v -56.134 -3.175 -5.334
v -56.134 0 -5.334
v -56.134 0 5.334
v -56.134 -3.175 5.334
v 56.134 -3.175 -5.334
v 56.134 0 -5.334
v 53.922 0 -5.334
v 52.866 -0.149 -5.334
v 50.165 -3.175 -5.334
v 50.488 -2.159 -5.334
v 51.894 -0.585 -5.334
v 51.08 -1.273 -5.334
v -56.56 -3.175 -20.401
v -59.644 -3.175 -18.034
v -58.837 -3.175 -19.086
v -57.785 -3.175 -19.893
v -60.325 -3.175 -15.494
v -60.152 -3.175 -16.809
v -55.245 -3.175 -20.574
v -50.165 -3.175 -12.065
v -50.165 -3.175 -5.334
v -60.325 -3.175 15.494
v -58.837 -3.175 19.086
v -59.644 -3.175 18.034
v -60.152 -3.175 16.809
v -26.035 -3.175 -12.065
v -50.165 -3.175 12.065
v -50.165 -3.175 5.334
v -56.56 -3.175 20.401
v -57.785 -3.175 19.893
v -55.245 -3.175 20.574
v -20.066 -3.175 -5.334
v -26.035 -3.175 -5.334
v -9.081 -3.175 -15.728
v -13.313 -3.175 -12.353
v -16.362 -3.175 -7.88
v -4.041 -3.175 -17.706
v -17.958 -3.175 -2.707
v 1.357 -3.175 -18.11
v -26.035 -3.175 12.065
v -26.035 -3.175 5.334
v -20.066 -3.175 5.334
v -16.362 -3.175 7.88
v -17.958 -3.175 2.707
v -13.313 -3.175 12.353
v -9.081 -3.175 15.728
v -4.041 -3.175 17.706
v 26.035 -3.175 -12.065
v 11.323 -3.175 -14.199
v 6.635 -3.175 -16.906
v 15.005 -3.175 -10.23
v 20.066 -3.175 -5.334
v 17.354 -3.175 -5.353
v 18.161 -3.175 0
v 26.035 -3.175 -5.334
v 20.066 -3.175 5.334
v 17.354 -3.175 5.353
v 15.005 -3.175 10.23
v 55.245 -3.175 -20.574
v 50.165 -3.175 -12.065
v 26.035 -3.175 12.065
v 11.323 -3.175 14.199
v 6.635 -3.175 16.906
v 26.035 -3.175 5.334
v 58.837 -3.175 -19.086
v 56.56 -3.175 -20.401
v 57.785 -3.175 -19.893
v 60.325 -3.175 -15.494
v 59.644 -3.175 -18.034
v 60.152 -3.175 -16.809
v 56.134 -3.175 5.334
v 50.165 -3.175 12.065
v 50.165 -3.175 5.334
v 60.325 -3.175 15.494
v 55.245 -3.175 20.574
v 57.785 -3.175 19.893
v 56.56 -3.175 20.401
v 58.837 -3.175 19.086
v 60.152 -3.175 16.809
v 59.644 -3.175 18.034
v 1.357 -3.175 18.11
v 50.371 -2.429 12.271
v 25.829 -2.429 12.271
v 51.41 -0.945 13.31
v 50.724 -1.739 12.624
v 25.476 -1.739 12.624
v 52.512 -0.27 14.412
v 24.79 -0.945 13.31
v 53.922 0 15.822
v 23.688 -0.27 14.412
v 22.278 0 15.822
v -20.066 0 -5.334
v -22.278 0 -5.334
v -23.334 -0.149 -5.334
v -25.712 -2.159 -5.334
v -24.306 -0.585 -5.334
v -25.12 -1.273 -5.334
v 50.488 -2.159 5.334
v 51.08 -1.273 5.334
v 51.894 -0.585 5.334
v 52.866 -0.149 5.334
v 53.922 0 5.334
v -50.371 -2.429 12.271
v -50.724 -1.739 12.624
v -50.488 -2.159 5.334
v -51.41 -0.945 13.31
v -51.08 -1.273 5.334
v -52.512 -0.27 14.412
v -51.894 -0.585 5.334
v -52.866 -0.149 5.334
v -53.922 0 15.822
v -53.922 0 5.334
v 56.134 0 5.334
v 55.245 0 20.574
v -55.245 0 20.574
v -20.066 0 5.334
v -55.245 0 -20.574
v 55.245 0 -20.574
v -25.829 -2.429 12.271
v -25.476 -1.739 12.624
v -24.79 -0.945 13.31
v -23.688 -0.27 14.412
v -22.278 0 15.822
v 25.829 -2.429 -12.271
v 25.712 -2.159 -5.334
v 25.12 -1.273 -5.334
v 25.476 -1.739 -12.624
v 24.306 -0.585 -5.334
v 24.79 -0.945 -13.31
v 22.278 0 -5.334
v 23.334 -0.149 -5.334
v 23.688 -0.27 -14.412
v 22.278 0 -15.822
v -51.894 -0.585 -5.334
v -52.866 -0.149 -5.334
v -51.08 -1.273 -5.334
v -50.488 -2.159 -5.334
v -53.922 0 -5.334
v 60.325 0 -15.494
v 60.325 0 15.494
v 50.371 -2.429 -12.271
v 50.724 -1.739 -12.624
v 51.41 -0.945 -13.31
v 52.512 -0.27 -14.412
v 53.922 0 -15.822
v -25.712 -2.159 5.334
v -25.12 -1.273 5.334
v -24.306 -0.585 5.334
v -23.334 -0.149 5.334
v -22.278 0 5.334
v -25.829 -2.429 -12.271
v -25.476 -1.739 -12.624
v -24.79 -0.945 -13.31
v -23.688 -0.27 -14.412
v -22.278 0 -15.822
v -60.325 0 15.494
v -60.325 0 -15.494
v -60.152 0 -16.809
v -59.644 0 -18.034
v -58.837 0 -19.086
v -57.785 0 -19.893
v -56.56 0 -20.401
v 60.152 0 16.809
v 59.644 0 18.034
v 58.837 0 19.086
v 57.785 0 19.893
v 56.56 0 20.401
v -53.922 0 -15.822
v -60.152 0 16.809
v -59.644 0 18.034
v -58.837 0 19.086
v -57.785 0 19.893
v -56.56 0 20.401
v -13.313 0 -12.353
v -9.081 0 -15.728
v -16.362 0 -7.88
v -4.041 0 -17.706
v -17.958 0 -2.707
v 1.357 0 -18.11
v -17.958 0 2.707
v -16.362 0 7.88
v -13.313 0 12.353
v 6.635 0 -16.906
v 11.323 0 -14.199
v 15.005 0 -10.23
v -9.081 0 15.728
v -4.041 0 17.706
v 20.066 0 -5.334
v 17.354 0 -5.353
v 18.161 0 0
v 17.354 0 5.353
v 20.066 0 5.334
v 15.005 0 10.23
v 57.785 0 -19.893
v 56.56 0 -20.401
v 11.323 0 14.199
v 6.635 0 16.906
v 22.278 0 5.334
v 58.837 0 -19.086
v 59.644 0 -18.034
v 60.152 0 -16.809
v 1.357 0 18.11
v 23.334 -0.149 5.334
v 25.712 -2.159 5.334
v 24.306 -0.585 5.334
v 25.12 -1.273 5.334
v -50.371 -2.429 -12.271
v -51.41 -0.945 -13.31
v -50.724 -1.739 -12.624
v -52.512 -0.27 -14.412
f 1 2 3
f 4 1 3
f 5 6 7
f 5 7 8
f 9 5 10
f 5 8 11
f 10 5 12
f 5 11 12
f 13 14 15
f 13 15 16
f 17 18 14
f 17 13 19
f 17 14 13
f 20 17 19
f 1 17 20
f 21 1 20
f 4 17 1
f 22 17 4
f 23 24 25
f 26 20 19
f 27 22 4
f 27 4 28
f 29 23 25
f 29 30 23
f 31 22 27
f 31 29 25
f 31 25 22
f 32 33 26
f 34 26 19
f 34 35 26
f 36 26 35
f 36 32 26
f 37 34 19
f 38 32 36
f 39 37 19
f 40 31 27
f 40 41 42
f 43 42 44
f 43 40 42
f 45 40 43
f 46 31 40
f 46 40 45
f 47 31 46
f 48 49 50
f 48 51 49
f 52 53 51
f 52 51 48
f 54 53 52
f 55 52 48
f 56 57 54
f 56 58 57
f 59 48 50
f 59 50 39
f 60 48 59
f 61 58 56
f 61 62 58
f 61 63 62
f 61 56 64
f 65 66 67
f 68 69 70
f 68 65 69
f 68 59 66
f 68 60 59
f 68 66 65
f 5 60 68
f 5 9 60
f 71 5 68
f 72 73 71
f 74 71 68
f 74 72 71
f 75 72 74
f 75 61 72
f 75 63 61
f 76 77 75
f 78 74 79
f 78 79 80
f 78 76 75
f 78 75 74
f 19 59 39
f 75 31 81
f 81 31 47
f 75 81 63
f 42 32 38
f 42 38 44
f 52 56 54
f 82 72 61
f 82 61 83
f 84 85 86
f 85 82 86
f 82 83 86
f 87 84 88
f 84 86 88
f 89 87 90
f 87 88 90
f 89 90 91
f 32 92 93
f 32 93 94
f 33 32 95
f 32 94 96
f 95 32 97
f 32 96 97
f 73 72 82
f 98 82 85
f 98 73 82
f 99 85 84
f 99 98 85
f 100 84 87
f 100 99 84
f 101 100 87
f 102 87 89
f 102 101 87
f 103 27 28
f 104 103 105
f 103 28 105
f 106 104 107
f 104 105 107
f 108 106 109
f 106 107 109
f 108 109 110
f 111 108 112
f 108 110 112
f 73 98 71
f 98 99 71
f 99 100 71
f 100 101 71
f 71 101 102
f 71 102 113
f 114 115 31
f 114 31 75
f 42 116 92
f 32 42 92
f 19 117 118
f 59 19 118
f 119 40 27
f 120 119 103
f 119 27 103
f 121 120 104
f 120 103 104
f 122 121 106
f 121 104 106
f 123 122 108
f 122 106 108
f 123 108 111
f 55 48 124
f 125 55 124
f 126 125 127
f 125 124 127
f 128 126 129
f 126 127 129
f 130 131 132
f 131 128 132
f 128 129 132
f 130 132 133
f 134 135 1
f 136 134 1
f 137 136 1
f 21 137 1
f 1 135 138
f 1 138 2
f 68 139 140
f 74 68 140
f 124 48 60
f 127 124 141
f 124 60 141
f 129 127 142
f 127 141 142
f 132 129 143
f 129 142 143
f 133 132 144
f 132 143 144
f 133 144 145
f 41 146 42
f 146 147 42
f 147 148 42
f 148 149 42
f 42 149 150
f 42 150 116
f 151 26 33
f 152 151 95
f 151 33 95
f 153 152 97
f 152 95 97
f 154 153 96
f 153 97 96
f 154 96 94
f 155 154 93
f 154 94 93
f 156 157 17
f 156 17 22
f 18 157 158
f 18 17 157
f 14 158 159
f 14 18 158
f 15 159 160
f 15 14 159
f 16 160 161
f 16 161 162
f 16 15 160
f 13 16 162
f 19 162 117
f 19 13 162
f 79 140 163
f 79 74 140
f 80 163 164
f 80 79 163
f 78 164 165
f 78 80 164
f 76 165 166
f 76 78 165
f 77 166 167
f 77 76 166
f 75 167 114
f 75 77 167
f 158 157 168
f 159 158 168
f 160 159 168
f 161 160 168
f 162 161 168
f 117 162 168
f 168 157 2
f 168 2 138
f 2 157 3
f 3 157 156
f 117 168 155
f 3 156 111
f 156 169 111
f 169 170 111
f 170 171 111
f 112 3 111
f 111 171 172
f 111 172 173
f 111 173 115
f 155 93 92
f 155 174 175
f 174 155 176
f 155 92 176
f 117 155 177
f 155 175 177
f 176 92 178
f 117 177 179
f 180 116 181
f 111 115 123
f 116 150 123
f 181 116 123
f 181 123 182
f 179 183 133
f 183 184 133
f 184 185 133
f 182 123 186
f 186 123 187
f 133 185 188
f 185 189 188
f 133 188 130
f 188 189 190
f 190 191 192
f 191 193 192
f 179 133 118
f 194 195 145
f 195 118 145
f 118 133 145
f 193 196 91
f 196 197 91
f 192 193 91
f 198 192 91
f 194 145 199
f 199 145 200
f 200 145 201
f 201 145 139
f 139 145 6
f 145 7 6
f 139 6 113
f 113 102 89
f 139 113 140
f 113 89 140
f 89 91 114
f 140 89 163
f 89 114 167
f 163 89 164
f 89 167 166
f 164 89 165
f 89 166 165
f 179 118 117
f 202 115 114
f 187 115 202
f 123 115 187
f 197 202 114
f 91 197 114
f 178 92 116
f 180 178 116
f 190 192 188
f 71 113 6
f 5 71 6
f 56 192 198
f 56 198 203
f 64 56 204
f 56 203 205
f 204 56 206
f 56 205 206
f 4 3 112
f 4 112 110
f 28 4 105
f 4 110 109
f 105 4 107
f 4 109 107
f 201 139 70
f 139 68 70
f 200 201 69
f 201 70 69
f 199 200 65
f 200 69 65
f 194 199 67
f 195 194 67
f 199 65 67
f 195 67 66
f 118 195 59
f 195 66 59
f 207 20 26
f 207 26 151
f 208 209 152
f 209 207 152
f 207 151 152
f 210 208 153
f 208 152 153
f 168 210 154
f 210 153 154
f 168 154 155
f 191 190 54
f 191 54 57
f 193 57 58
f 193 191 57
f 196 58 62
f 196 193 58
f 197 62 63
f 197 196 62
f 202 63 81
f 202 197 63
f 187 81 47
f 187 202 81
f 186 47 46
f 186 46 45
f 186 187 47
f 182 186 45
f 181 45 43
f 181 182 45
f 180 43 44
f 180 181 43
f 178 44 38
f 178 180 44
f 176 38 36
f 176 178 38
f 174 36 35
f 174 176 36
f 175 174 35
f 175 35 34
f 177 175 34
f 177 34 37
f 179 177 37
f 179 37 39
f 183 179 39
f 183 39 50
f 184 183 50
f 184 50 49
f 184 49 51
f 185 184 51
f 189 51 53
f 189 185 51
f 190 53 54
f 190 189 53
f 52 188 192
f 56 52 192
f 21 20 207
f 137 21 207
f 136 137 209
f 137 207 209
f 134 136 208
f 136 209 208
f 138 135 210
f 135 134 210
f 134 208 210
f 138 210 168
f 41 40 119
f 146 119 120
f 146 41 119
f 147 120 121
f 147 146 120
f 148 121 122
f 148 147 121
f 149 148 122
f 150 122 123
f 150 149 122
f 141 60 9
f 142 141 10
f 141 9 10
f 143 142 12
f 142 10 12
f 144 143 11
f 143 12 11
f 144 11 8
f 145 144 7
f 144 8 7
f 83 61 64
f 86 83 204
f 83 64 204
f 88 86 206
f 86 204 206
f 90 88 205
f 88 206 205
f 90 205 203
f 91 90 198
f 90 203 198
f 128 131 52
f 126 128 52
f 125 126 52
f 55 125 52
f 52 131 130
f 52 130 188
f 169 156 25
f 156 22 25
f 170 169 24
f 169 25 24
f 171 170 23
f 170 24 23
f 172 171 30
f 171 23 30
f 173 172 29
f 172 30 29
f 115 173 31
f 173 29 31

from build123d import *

# Parameters (mm, degrees)
F0_W          = 120.65
F0_H          = 41.148
F0_R          = 18.161
F1_DEPTH      = 3.175
F2_T1_DEPTH   = 24.13
F2_T3_DEPTH   = 16.1227766557
F2_T5_DEPTH   = 24.13
F2_T7_DEPTH   = 16.1227766557
F2_T13_DEPTH  = 16.1227766557
F2_T18_DEPTH  = 33.5217766557
F2_T25_DEPTH  = 33.5217766557
F2_T29_DEPTH  = 16.1227766557
F2_T37_DEPTH  = 33.5217766557
F2_T41_DEPTH  = 16.1227766557
F2_T49_DEPTH  = 16.1227766557
F2_T54_DEPTH  = 33.5217766557
F2_T61_DEPTH  = 33.5217766557
F2_T65_DEPTH  = 16.1227766557
F2_T73_DEPTH  = 16.1227766557
F2_T78_DEPTH  = 33.5217766557
F2_T85_DEPTH  = 33.5217766557
F2_T89_DEPTH  = 16.1227766557
F2_T97_DEPTH  = 16.1227766557
F2_T102_DEPTH = 33.5217766557
F3_R          = 5.08


# Not quite as in the source:
# - a fillet or chamfer that OpenCascade refuses, or shapes differently, is made with other operations: its cross-section is extruded or revolved along the edge and cut away or added
# - a feature names something its author has since deleted; it is built from what else it names


with BuildPart() as f1:
    # F0 (on Front) → F1 (new body)
    with BuildSketch(Plane.XZ):
        Rectangle(F0_W, F0_H)
        Polygon((-26.035, 5.334), (-20.066, 5.334), (-20.066, -5.334), (-26.035, -5.334), (-26.035, -12.065), (-50.165, -12.065), (-50.165, -5.334), (-56.134, -5.334), (-56.134, 5.334), (-50.165, 5.334), (-50.165, 12.065), (-26.035, 12.065), align=None, mode=Mode.SUBTRACT)
        Circle(F0_R, mode=Mode.SUBTRACT)
        Polygon((50.165, 5.334), (56.134, 5.334), (56.134, -5.334), (50.165, -5.334), (50.165, -12.065), (26.035, -12.065), (26.035, -5.334), (20.066, -5.334), (20.066, 5.334), (26.035, 5.334), (26.035, 12.065), (50.165, 12.065), align=None, mode=Mode.SUBTRACT)
    extrude(amount=F1_DEPTH)

    # F2: fillet of radius 3.81 on 12 edges, made by hand

    # F2_s2 → F2_t1 (cut)
    with BuildSketch(Plane.YZ.offset(26.035)):
        with BuildLine():
            ThreePointArc((-3.175, 12.065), (-0.9000644337, 13.3623662374), (0, 15.8217106623))
            Line((0, 15.8217106623), (0, 12.065))
            Line((0, 12.065), (-3.175, 12.065))
        make_face()
        with BuildLine():
            ThreePointArc((-3.175, -12.065), (-0.9000644337, -13.3623662374), (0, -15.8217106623))
            Line((0, -15.8217106623), (0, -12.065))
            Line((0, -12.065), (-3.175, -12.065))
        make_face()
    extrude(amount=F2_T1_DEPTH, mode=Mode.SUBTRACT)

    # F2_s4 → F2_t3 (cut)
    with BuildSketch(Plane.XY.offset(-4.0577766557)):
        with BuildLine():
            ThreePointArc((26.035, -3.175), (24.7376337626, -0.9000644337), (22.2782893377, 0))
            Line((22.2782893377, 0), (26.035, 0))
            Line((26.035, 0), (26.035, -3.175))
        make_face()
        with BuildLine():
            ThreePointArc((50.165, -3.175), (51.4623662374, -0.9000644337), (53.9217106623, 0))
            Line((53.9217106623, 0), (50.165, 0))
            Line((50.165, 0), (50.165, -3.175))
        make_face()
        with BuildLine():
            ThreePointArc((-26.035, -3.175), (-24.7376337626, -0.9000644337), (-22.2782893377, 0))
            Line((-22.2782893377, 0), (-26.035, 0))
            Line((-26.035, 0), (-26.035, -3.175))
        make_face()
        with BuildLine():
            ThreePointArc((-50.165, -3.175), (-51.4623662374, -0.9000644337), (-53.9217106623, 0))
            Line((-53.9217106623, 0), (-50.165, 0))
            Line((-50.165, 0), (-50.165, -3.175))
        make_face()
    extrude(amount=F2_T3_DEPTH, mode=Mode.SUBTRACT)

    # F2_s6 → F2_t5 (cut)
    with BuildSketch(Plane.YZ.offset(-50.165)):
        with BuildLine():
            ThreePointArc((-3.175, 12.065), (-0.9000644337, 13.3623662374), (0, 15.8217106623))
            Line((0, 15.8217106623), (0, 12.065))
            Line((0, 12.065), (-3.175, 12.065))
        make_face()
        with BuildLine():
            ThreePointArc((-3.175, -12.065), (-0.9000644337, -13.3623662374), (0, -15.8217106623))
            Line((0, -15.8217106623), (0, -12.065))
            Line((0, -12.065), (-3.175, -12.065))
        make_face()
    extrude(amount=F2_T5_DEPTH, mode=Mode.SUBTRACT)

    # F2_s8 → F2_t7 (cut)
    with BuildSketch(Plane.XY.offset(-12.065)):
        with BuildLine():
            ThreePointArc((-50.165, -3.175), (-51.4623662374, -0.9000644337), (-53.9217106623, 0))
            Line((-53.9217106623, 0), (-50.165, 0))
            Line((-50.165, 0), (-50.165, -3.175))
        make_face()
        with BuildLine():
            ThreePointArc((-26.035, -3.175), (-24.7376337626, -0.9000644337), (-22.2782893377, 0))
            Line((-22.2782893377, 0), (-26.035, 0))
            Line((-26.035, 0), (-26.035, -3.175))
        make_face()
        with BuildLine():
            ThreePointArc((26.035, -3.175), (24.7376337626, -0.9000644337), (22.2782893377, 0))
            Line((22.2782893377, 0), (26.035, 0))
            Line((26.035, 0), (26.035, -3.175))
        make_face()
        with BuildLine():
            ThreePointArc((50.165, -3.175), (51.4623662374, -0.9000644337), (53.9217106623, 0))
            Line((53.9217106623, 0), (50.165, 0))
            Line((50.165, 0), (50.165, -3.175))
        make_face()
    extrude(amount=F2_T7_DEPTH, mode=Mode.SUBTRACT)


with BuildPart() as f2_tool11:
    # F2_s12 → F2_t13 (new body)
    with BuildSketch(Plane.XY.offset(5.334)):
        with BuildLine():
            ThreePointArc((26.035, -3.175), (24.7376337626, -0.9000644337), (22.2782893377, 0))
            Line((22.2782893377, 0), (26.035, 0))
            Line((26.035, 0), (26.035, -3.175))
        make_face()
    extrude(amount=F2_T13_DEPTH)

    split(bisect_by=Plane.XY.offset(20.574), keep=Keep.BOTTOM)

    split(bisect_by=Plane.XY.offset(12.065), keep=Keep.TOP)


with BuildPart() as f2_tool16:
    # F2_s17 → F2_t18 (new body)
    with BuildSketch(Plane.YZ.offset(16.6432233443)):
        with BuildLine():
            ThreePointArc((-3.175, 12.065), (-0.9000644337, 13.3623662374), (0, 15.8217106623))
            Line((0, 15.8217106623), (0, 12.065))
            Line((0, 12.065), (-3.175, 12.065))
        make_face()
    extrude(amount=F2_T18_DEPTH)

    split(bisect_by=Plane.YZ.offset(26.035), keep=Keep.BOTTOM)


with BuildPart() as f2_tool11_1:
    add(f2_tool11.part)

    # F2_t20: intersect F2_tool16
    add(f2_tool16.part, mode=Mode.INTERSECT)


with BuildPart() as f1_1:
    add(f1.part)

    # F2_t9: cut F2_tool11
    add(f2_tool11_1.part, mode=Mode.SUBTRACT)


with BuildPart() as f2_tool23:
    # F2_s24 → F2_t25 (new body)
    with BuildSketch(Plane.YZ.offset(26.035)):
        with BuildLine():
            ThreePointArc((-3.175, 12.065), (-0.9000644337, 13.3623662374), (0, 15.8217106623))
            Line((0, 15.8217106623), (0, 12.065))
            Line((0, 12.065), (-3.175, 12.065))
        make_face()
    extrude(amount=F2_T25_DEPTH)

    split(bisect_by=Plane.YZ.offset(50.165), keep=Keep.TOP)


with BuildPart() as f2_tool27:
    # F2_s28 → F2_t29 (new body)
    with BuildSketch(Plane.XY.offset(21.4567766557)):
        with BuildLine():
            ThreePointArc((50.165, -3.175), (51.4623662374, -0.9000644337), (53.9217106623, 0))
            Line((53.9217106623, 0), (50.165, 0))
            Line((50.165, 0), (50.165, -3.175))
        make_face()
    extrude(amount=-F2_T29_DEPTH)

    split(bisect_by=Plane.XY.offset(20.574), keep=Keep.BOTTOM)

    split(bisect_by=Plane.XY.offset(12.065), keep=Keep.TOP)


with BuildPart() as f2_tool23_1:
    add(f2_tool23.part)

    # F2_t32: intersect F2_tool27
    add(f2_tool27.part, mode=Mode.INTERSECT)


with BuildPart() as f1_2:
    add(f1_1.part)

    # F2_t21: cut F2_tool23
    add(f2_tool23_1.part, mode=Mode.SUBTRACT)


with BuildPart() as f2_tool35:
    # F2_s36 → F2_t37 (new body)
    with BuildSketch(Plane.YZ.offset(-50.165)):
        with BuildLine():
            ThreePointArc((-3.175, 12.065), (-0.9000644337, 13.3623662374), (0, 15.8217106623))
            Line((0, 15.8217106623), (0, 12.065))
            Line((0, 12.065), (-3.175, 12.065))
        make_face()
    extrude(amount=F2_T37_DEPTH)

    split(bisect_by=Plane.YZ.offset(-26.035), keep=Keep.TOP)


with BuildPart() as f2_tool39:
    # F2_s40 → F2_t41 (new body)
    with BuildSketch(Plane.XY.offset(21.4567766557)):
        with BuildLine():
            ThreePointArc((-26.035, -3.175), (-24.7376337626, -0.9000644337), (-22.2782893377, 0))
            Line((-22.2782893377, 0), (-26.035, 0))
            Line((-26.035, 0), (-26.035, -3.175))
        make_face()
    extrude(amount=-F2_T41_DEPTH)

    split(bisect_by=Plane.XY.offset(20.574), keep=Keep.BOTTOM)

    split(bisect_by=Plane.XY.offset(12.065), keep=Keep.TOP)


with BuildPart() as f2_tool35_1:
    add(f2_tool35.part)

    # F2_t44: intersect F2_tool39
    add(f2_tool39.part, mode=Mode.INTERSECT)


with BuildPart() as f1_3:
    add(f1_2.part)

    # F2_t33: cut F2_tool35
    add(f2_tool35_1.part, mode=Mode.SUBTRACT)


with BuildPart() as f2_tool47:
    # F2_s48 → F2_t49 (new body)
    with BuildSketch(Plane.XY.offset(5.334)):
        with BuildLine():
            ThreePointArc((-50.165, -3.175), (-51.4623662374, -0.9000644337), (-53.9217106623, 0))
            Line((-53.9217106623, 0), (-50.165, 0))
            Line((-50.165, 0), (-50.165, -3.175))
        make_face()
    extrude(amount=F2_T49_DEPTH)

    split(bisect_by=Plane.XY.offset(20.574), keep=Keep.BOTTOM)

    split(bisect_by=Plane.XY.offset(12.065), keep=Keep.TOP)


with BuildPart() as f2_tool52:
    # F2_s53 → F2_t54 (new body)
    with BuildSketch(Plane.YZ.offset(-59.5567766557)):
        with BuildLine():
            ThreePointArc((-3.175, 12.065), (-0.9000644337, 13.3623662374), (0, 15.8217106623))
            Line((0, 15.8217106623), (0, 12.065))
            Line((0, 12.065), (-3.175, 12.065))
        make_face()
    extrude(amount=F2_T54_DEPTH)

    split(bisect_by=Plane.YZ.offset(-50.165), keep=Keep.BOTTOM)


with BuildPart() as f2_tool47_1:
    add(f2_tool47.part)

    # F2_t56: intersect F2_tool52
    add(f2_tool52.part, mode=Mode.INTERSECT)


with BuildPart() as f1_4:
    add(f1_3.part)

    # F2_t45: cut F2_tool47
    add(f2_tool47_1.part, mode=Mode.SUBTRACT)


with BuildPart() as f2_tool59:
    # F2_s60 → F2_t61 (new body)
    with BuildSketch(Plane.YZ.offset(-26.035)):
        with BuildLine():
            ThreePointArc((-3.175, -12.065), (-0.9000644337, -13.3623662374), (0, -15.8217106623))
            Line((0, -15.8217106623), (0, -12.065))
            Line((0, -12.065), (-3.175, -12.065))
        make_face()
    extrude(amount=-F2_T61_DEPTH)

    split(bisect_by=Plane.YZ.offset(-50.165), keep=Keep.BOTTOM)


with BuildPart() as f2_tool63:
    # F2_s64 → F2_t65 (new body)
    with BuildSketch(Plane.XY.offset(-21.4567766557)):
        with BuildLine():
            ThreePointArc((-50.165, -3.175), (-51.4623662374, -0.9000644337), (-53.9217106623, 0))
            Line((-53.9217106623, 0), (-50.165, 0))
            Line((-50.165, 0), (-50.165, -3.175))
        make_face()
    extrude(amount=F2_T65_DEPTH)

    split(bisect_by=Plane.XY.offset(-20.574), keep=Keep.TOP)

    split(bisect_by=Plane.XY.offset(-12.065), keep=Keep.BOTTOM)


with BuildPart() as f2_tool59_1:
    add(f2_tool59.part)

    # F2_t68: intersect F2_tool63
    add(f2_tool63.part, mode=Mode.INTERSECT)


with BuildPart() as f1_5:
    add(f1_4.part)

    # F2_t57: cut F2_tool59
    add(f2_tool59_1.part, mode=Mode.SUBTRACT)


with BuildPart() as f2_tool71:
    # F2_s72 → F2_t73 (new body)
    with BuildSketch(Plane.XY.offset(-5.334)):
        with BuildLine():
            ThreePointArc((-26.035, -3.175), (-24.7376337626, -0.9000644337), (-22.2782893377, 0))
            Line((-22.2782893377, 0), (-26.035, 0))
            Line((-26.035, 0), (-26.035, -3.175))
        make_face()
    extrude(amount=-F2_T73_DEPTH)

    split(bisect_by=Plane.XY.offset(-20.574), keep=Keep.TOP)

    split(bisect_by=Plane.XY.offset(-12.065), keep=Keep.BOTTOM)


with BuildPart() as f2_tool76:
    # F2_s77 → F2_t78 (new body)
    with BuildSketch(Plane.YZ.offset(-16.6432233443)):
        with BuildLine():
            ThreePointArc((-3.175, -12.065), (-0.9000644337, -13.3623662374), (0, -15.8217106623))
            Line((0, -15.8217106623), (0, -12.065))
            Line((0, -12.065), (-3.175, -12.065))
        make_face()
    extrude(amount=-F2_T78_DEPTH)

    split(bisect_by=Plane.YZ.offset(-26.035), keep=Keep.TOP)


with BuildPart() as f2_tool71_1:
    add(f2_tool71.part)

    # F2_t80: intersect F2_tool76
    add(f2_tool76.part, mode=Mode.INTERSECT)


with BuildPart() as f1_6:
    add(f1_5.part)

    # F2_t69: cut F2_tool71
    add(f2_tool71_1.part, mode=Mode.SUBTRACT)


with BuildPart() as f2_tool83:
    # F2_s84 → F2_t85 (new body)
    with BuildSketch(Plane.YZ.offset(50.165)):
        with BuildLine():
            ThreePointArc((-3.175, -12.065), (-0.9000644337, -13.3623662374), (0, -15.8217106623))
            Line((0, -15.8217106623), (0, -12.065))
            Line((0, -12.065), (-3.175, -12.065))
        make_face()
    extrude(amount=-F2_T85_DEPTH)

    split(bisect_by=Plane.YZ.offset(26.035), keep=Keep.BOTTOM)


with BuildPart() as f2_tool87:
    # F2_s88 → F2_t89 (new body)
    with BuildSketch(Plane.XY.offset(-21.4567766557)):
        with BuildLine():
            ThreePointArc((26.035, -3.175), (24.7376337626, -0.9000644337), (22.2782893377, 0))
            Line((22.2782893377, 0), (26.035, 0))
            Line((26.035, 0), (26.035, -3.175))
        make_face()
    extrude(amount=F2_T89_DEPTH)

    split(bisect_by=Plane.XY.offset(-20.574), keep=Keep.TOP)

    split(bisect_by=Plane.XY.offset(-12.065), keep=Keep.BOTTOM)


with BuildPart() as f2_tool83_1:
    add(f2_tool83.part)

    # F2_t92: intersect F2_tool87
    add(f2_tool87.part, mode=Mode.INTERSECT)


with BuildPart() as f1_7:
    add(f1_6.part)

    # F2_t81: cut F2_tool83
    add(f2_tool83_1.part, mode=Mode.SUBTRACT)


with BuildPart() as f2_tool95:
    # F2_s96 → F2_t97 (new body)
    with BuildSketch(Plane.XY.offset(-5.334)):
        with BuildLine():
            ThreePointArc((50.165, -3.175), (51.4623662374, -0.9000644337), (53.9217106623, 0))
            Line((53.9217106623, 0), (50.165, 0))
            Line((50.165, 0), (50.165, -3.175))
        make_face()
    extrude(amount=-F2_T97_DEPTH)

    split(bisect_by=Plane.XY.offset(-20.574), keep=Keep.TOP)

    split(bisect_by=Plane.XY.offset(-12.065), keep=Keep.BOTTOM)


with BuildPart() as f2_tool100:
    # F2_s101 → F2_t102 (new body)
    with BuildSketch(Plane.YZ.offset(59.5567766557)):
        with BuildLine():
            ThreePointArc((-3.175, -12.065), (-0.9000644337, -13.3623662374), (0, -15.8217106623))
            Line((0, -15.8217106623), (0, -12.065))
            Line((0, -12.065), (-3.175, -12.065))
        make_face()
    extrude(amount=-F2_T102_DEPTH)

    split(bisect_by=Plane.YZ.offset(50.165), keep=Keep.TOP)


with BuildPart() as f2_tool95_1:
    add(f2_tool95.part)

    # F2_t104: intersect F2_tool100
    add(f2_tool100.part, mode=Mode.INTERSECT)


with BuildPart() as f1_8:
    add(f1_7.part)

    # F2_t93: cut F2_tool95
    add(f2_tool95_1.part, mode=Mode.SUBTRACT)

    # F3
    f3_edges = [f1_8.edges().sort_by_distance(p)[0] for p in [
        (60.325, -1.5875, 20.574),
        (-60.325, -1.5875, 20.574),
        (-60.325, -1.5875, -20.574),
        (60.325, -1.5875, -20.574),
    ]]
    fillet(f3_edges, radius=F3_R)


solid = f1_8.part
